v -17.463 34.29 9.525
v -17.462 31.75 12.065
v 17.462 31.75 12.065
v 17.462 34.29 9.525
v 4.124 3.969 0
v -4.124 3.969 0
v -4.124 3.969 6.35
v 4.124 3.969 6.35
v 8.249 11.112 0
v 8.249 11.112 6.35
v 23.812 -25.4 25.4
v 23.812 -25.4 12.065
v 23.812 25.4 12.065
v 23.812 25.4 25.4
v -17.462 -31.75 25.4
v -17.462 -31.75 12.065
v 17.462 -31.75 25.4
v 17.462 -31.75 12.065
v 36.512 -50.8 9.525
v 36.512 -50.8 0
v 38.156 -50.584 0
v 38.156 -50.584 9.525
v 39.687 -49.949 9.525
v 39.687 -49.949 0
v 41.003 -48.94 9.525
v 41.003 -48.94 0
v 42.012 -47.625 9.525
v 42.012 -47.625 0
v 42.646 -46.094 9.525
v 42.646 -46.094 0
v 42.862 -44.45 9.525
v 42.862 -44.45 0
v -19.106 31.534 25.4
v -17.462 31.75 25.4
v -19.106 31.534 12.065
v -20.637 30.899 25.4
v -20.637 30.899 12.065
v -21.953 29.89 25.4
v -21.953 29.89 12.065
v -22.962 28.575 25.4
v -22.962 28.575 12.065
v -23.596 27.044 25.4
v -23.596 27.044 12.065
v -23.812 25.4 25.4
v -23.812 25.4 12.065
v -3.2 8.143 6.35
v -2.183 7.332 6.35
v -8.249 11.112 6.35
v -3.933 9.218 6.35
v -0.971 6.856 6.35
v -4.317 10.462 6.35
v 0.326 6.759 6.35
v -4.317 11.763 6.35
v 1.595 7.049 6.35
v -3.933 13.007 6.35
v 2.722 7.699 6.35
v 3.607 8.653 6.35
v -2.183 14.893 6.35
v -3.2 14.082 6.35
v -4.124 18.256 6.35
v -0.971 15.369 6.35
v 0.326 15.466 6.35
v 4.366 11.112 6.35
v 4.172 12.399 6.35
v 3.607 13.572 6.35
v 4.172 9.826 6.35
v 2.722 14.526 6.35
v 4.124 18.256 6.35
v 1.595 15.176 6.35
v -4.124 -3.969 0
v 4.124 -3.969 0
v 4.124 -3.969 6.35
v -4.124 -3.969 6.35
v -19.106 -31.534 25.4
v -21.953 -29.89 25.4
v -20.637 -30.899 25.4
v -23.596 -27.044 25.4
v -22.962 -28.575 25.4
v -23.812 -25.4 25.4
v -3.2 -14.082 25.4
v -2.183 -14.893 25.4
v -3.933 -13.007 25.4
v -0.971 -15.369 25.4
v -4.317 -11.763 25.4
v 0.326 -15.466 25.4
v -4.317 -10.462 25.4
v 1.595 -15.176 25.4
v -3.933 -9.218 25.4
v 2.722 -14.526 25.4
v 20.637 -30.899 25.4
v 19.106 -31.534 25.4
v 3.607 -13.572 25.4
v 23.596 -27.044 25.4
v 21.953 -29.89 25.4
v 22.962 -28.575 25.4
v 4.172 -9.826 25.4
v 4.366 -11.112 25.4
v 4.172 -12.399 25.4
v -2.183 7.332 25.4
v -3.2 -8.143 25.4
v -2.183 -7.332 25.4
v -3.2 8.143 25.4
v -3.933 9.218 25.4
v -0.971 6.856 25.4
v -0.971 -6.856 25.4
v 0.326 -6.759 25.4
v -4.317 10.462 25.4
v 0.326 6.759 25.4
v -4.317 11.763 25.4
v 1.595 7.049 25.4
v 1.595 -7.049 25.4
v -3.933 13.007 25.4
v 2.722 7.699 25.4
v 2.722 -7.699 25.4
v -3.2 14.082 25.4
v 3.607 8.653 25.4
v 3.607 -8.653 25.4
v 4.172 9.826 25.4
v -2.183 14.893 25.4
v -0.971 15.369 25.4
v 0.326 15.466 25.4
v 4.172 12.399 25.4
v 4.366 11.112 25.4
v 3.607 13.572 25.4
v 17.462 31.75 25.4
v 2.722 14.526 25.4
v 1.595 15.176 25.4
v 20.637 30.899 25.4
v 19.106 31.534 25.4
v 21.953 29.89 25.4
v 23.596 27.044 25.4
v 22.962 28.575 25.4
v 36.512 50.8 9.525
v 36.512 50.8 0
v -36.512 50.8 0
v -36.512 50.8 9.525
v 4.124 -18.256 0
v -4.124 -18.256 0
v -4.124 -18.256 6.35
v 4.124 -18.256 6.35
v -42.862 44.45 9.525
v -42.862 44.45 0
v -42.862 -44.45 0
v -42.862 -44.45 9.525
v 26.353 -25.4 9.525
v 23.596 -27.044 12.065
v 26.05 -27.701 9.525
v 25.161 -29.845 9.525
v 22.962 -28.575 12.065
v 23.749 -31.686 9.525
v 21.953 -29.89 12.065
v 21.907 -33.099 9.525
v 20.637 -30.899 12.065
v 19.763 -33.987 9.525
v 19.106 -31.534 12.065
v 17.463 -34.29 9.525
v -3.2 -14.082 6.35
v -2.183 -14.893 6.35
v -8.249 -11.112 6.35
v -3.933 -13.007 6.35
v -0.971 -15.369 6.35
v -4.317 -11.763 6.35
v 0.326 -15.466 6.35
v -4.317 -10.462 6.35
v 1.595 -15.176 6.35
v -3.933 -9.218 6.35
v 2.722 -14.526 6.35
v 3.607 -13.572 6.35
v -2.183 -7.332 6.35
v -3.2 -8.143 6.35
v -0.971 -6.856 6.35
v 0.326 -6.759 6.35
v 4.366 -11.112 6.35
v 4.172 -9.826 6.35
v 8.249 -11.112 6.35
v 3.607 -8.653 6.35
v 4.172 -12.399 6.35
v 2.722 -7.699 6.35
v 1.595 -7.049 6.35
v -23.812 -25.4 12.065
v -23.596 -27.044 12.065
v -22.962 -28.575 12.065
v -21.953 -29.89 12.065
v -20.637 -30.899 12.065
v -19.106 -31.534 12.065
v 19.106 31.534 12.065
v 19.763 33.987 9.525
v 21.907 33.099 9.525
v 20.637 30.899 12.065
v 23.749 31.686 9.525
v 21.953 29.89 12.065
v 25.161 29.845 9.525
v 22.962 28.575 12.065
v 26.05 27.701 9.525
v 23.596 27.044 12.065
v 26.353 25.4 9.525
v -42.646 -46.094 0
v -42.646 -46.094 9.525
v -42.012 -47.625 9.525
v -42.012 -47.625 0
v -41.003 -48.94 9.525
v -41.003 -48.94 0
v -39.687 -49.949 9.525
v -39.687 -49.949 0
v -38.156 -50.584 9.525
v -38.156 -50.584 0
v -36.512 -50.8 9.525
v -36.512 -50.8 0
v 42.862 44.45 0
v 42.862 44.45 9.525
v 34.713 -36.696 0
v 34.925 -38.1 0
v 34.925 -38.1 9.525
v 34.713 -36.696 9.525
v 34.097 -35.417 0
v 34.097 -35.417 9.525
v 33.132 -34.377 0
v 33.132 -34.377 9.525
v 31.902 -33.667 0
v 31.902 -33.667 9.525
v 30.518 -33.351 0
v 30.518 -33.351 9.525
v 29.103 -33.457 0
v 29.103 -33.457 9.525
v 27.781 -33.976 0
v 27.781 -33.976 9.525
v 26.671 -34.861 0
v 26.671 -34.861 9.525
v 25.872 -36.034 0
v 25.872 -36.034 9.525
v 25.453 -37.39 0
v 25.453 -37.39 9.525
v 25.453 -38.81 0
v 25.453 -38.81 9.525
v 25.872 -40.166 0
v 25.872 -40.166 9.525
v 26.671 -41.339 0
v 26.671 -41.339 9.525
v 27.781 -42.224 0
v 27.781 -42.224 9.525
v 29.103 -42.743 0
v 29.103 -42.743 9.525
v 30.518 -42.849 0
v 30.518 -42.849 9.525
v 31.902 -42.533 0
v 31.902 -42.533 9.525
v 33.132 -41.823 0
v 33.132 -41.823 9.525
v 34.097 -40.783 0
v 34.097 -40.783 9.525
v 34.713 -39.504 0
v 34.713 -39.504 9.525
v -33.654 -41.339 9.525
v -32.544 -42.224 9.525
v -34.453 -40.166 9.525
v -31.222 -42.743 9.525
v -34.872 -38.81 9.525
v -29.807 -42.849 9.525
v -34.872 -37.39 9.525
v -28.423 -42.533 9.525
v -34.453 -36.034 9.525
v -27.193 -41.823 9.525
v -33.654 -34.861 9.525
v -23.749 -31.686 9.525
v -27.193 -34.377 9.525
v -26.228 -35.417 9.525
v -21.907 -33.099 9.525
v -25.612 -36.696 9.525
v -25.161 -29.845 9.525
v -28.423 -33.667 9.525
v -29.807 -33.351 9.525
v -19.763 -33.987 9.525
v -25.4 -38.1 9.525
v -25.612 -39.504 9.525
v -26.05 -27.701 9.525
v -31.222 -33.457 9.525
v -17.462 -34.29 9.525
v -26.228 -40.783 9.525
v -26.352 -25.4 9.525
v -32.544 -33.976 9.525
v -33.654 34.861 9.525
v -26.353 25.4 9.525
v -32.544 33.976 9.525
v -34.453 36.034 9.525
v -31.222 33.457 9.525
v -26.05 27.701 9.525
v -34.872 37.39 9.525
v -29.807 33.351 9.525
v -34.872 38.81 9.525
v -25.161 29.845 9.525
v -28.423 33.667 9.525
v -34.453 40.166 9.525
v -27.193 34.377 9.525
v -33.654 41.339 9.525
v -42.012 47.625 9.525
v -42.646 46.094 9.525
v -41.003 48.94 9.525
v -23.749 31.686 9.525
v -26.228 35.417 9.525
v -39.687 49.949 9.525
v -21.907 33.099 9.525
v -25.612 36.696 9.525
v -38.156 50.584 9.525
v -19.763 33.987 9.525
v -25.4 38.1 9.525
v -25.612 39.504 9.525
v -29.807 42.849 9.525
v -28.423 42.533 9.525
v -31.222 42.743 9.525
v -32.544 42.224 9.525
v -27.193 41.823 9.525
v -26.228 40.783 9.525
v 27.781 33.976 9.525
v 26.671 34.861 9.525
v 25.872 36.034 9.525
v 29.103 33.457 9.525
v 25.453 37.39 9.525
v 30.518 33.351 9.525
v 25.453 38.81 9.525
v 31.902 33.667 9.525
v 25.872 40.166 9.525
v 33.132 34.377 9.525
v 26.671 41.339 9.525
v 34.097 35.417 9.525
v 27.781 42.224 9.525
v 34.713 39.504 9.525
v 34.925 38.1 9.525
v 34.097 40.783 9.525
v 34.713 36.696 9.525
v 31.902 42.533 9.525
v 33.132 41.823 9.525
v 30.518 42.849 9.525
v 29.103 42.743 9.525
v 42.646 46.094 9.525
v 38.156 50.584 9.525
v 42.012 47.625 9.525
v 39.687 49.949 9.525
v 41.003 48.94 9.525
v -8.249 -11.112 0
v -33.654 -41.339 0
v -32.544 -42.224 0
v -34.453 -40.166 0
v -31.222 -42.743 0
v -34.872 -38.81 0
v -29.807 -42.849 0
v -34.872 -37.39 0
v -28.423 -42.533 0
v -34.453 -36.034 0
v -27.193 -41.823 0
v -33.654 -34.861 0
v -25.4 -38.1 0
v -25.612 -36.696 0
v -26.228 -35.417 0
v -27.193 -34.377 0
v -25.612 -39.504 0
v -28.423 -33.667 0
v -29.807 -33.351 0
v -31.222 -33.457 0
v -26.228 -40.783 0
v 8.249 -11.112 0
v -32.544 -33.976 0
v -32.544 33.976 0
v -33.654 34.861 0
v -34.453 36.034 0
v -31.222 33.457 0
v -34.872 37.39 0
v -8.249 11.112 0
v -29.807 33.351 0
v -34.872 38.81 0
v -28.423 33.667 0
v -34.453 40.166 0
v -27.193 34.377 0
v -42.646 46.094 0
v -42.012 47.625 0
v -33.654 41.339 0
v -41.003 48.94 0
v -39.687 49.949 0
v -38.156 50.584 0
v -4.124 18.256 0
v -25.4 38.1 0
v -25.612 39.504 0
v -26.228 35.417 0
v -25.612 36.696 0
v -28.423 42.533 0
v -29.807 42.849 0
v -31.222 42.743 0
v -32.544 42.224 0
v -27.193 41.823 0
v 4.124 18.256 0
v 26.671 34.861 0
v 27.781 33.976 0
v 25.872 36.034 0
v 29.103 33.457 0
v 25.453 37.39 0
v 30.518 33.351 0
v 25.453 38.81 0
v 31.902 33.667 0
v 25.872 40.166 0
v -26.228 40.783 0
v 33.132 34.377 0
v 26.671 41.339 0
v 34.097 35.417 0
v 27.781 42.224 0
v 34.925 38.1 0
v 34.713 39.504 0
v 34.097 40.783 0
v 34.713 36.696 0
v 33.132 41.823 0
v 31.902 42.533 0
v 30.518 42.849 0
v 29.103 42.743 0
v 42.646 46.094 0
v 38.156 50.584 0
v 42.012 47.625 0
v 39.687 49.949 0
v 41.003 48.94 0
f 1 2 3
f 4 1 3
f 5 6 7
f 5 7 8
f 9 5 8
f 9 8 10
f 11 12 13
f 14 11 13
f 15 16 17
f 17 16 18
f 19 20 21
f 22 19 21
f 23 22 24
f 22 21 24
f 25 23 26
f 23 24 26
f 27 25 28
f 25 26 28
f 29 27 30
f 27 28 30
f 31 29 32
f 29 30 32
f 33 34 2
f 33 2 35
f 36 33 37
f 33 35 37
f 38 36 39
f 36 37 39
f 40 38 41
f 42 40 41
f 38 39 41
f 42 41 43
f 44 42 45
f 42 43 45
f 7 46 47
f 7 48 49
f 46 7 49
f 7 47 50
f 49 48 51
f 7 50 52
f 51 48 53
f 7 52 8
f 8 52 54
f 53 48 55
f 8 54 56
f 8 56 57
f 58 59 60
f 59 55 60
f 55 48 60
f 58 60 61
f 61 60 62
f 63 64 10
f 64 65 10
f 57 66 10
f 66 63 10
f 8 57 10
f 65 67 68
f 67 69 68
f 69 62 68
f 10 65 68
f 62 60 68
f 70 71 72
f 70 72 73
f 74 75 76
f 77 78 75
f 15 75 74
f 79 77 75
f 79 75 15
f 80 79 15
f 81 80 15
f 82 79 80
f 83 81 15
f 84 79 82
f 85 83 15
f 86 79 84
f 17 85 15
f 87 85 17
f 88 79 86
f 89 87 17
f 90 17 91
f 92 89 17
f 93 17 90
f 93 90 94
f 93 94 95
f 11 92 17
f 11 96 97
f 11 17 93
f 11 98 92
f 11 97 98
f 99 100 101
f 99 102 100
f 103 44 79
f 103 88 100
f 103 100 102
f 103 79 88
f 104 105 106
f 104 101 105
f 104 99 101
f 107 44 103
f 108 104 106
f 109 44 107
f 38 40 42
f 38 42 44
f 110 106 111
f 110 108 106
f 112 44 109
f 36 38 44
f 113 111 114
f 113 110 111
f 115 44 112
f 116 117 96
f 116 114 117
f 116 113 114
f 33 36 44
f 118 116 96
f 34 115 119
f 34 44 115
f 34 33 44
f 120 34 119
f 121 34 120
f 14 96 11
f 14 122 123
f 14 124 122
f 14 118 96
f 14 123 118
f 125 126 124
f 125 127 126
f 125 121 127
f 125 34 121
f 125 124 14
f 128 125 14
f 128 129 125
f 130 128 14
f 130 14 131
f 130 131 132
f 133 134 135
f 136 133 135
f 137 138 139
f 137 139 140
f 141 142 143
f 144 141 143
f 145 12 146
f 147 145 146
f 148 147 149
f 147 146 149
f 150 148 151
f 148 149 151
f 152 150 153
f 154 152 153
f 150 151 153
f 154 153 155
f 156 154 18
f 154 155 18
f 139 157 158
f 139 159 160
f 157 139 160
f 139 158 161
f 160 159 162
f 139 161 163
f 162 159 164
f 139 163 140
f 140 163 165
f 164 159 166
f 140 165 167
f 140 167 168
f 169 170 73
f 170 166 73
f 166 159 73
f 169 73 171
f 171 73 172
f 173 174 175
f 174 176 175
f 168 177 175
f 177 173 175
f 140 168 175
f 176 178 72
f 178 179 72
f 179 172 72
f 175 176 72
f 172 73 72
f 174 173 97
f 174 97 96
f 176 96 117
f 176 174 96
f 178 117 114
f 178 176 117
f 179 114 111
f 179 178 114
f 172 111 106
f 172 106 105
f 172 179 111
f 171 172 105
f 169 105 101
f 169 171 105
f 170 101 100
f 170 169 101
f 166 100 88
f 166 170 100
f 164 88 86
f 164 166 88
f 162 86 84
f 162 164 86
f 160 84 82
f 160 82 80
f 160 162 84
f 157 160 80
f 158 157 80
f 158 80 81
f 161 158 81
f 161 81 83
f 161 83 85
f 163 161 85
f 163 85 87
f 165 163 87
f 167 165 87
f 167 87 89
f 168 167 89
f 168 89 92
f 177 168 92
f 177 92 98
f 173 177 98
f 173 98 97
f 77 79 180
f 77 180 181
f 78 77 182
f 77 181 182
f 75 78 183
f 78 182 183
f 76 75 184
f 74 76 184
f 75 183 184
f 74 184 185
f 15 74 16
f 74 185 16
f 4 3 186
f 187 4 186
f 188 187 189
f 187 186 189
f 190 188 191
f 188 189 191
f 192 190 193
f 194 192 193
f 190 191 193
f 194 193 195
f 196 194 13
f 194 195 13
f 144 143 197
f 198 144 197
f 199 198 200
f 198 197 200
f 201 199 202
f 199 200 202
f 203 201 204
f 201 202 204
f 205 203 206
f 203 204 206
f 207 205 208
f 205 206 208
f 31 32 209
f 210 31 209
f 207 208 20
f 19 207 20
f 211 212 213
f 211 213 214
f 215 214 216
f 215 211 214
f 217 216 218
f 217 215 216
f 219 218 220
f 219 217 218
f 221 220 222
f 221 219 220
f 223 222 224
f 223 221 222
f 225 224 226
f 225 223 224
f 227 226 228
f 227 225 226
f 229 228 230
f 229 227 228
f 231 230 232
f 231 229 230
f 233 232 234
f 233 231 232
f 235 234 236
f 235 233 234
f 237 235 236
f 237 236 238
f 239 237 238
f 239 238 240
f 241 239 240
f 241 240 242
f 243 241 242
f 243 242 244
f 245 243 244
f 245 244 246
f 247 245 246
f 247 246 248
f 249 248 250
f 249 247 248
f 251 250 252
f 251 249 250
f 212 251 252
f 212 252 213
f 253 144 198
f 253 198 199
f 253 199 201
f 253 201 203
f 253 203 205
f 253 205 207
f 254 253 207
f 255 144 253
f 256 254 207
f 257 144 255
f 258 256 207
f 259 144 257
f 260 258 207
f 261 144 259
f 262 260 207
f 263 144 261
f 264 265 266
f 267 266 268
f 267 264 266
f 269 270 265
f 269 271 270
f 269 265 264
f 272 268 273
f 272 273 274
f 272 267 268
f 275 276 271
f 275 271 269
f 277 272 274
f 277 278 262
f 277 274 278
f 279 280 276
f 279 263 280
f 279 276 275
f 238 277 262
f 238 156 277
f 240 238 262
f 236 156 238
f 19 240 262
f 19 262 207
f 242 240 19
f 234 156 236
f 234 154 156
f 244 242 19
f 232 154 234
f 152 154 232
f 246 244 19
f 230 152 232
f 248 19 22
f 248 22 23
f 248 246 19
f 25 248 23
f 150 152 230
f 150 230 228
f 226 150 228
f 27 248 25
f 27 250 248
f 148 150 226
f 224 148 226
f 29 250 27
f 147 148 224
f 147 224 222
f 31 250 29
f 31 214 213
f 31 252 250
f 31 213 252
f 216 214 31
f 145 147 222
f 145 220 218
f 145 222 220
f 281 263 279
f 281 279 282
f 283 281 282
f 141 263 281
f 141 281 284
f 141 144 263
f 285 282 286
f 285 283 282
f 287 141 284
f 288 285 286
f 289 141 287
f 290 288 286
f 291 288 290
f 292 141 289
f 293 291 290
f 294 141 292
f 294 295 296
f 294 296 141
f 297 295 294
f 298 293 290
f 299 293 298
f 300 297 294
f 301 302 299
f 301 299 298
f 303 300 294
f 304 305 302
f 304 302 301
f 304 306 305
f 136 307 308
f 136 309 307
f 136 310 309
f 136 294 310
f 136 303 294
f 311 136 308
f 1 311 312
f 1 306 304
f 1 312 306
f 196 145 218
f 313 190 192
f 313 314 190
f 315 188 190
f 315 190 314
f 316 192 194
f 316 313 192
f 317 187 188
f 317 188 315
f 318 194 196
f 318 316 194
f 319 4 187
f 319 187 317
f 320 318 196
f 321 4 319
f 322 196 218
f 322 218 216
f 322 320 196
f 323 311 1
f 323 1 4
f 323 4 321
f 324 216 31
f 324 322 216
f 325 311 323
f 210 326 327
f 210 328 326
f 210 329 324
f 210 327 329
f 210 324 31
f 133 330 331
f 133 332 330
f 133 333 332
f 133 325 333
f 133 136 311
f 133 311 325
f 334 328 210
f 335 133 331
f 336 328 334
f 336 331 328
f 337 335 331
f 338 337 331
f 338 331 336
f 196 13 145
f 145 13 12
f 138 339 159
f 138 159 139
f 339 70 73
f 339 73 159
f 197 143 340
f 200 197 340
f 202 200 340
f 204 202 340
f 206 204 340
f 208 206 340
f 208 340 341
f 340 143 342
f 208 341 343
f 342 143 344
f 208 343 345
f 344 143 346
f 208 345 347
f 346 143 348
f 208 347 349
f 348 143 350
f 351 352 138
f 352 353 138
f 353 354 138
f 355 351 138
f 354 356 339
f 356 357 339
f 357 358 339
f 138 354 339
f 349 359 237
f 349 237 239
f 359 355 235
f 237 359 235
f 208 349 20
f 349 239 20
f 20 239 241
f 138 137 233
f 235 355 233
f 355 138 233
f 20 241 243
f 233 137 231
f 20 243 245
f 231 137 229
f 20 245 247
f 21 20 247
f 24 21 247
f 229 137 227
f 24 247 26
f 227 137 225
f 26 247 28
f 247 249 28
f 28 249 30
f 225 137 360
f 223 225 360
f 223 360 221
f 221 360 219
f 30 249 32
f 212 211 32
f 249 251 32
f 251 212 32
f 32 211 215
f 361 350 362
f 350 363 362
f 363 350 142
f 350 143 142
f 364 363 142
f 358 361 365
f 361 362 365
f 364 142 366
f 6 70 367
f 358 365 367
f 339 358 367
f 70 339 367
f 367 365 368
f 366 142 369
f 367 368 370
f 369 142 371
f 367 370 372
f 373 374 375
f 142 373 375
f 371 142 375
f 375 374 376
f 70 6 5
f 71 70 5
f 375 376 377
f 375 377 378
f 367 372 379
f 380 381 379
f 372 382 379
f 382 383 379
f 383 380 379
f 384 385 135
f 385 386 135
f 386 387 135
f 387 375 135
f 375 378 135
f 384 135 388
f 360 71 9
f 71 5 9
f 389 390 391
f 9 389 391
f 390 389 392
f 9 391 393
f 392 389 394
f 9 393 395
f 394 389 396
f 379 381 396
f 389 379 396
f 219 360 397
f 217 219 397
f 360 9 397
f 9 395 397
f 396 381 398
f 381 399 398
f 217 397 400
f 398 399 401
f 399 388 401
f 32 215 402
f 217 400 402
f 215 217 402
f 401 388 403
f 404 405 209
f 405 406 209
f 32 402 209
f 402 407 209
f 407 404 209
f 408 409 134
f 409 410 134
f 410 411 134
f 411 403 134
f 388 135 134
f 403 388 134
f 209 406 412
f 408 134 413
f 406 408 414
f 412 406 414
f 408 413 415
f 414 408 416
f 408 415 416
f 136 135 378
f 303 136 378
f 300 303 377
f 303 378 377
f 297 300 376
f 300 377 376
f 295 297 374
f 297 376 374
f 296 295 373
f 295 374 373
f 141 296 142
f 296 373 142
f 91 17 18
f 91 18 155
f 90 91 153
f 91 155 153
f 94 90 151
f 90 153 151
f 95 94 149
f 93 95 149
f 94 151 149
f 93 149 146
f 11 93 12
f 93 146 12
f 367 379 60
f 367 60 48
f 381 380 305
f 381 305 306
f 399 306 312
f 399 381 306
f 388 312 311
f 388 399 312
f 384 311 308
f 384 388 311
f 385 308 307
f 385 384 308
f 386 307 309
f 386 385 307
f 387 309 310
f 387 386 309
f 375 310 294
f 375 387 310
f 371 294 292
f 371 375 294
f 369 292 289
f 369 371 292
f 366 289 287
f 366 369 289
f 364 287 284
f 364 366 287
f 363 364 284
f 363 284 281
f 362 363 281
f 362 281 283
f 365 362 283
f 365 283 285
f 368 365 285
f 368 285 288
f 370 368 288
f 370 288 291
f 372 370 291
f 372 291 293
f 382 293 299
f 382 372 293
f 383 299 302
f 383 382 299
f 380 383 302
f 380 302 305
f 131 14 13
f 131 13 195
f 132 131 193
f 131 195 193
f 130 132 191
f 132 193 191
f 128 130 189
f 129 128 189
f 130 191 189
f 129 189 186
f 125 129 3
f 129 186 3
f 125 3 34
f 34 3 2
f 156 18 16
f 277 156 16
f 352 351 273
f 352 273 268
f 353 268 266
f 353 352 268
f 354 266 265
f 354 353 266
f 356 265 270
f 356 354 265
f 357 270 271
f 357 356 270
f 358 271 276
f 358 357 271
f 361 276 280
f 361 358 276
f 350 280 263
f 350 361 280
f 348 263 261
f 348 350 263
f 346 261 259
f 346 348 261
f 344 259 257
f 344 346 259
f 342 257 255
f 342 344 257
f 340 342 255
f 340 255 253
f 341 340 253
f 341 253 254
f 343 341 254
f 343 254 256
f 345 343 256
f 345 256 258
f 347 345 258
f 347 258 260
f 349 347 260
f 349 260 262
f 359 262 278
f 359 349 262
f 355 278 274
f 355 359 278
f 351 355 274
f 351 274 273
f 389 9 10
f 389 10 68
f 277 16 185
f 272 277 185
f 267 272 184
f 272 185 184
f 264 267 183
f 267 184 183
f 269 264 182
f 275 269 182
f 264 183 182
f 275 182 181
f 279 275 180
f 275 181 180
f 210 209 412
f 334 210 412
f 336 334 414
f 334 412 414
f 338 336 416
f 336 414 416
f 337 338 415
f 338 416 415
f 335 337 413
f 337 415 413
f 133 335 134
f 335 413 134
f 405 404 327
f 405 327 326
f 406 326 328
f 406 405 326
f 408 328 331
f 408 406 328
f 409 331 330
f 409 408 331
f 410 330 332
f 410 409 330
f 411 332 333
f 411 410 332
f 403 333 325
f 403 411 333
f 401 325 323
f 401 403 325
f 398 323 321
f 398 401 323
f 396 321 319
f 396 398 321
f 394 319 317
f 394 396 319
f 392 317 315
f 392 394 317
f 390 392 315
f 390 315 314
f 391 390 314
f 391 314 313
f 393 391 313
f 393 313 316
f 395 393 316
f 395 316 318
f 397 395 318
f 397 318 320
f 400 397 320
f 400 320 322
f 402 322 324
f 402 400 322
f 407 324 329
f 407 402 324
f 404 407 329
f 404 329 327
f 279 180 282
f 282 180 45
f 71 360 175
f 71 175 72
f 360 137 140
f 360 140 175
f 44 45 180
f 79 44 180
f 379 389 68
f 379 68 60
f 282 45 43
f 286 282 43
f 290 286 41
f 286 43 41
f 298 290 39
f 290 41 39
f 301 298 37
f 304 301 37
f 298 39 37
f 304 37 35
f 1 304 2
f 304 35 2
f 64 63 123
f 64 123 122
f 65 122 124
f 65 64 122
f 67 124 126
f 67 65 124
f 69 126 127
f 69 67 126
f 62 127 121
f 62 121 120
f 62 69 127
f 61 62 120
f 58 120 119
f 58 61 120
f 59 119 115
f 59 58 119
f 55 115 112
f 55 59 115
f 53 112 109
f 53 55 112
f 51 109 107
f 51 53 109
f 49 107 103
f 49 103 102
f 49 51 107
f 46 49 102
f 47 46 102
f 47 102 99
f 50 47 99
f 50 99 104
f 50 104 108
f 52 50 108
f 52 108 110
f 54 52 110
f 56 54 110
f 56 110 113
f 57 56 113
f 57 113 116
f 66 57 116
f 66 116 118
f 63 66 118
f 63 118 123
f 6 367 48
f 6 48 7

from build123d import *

# Parameters (mm, degrees)
F0_R     = 4.365625
F0_R_2   = 4.7625
F1_DEPTH = 9.525
F2_DEPTH = 25.4
F3_SIZE  = 2.54
F4_DEPTH = 6.35


with BuildPart() as f1:
    # F0 (on Top) → F1 (new body)
    with BuildSketch(Plane.XY):
        Polygon((-4.124446, -18.25625), (4.124446, -18.25625), (8.248892, -11.1125), (4.124446, -3.96875), (-4.124446, -3.96875), (-8.248892, -11.1125), align=None)
        with Locations((0, -11.1125)):
            Circle(F0_R, mode=Mode.SUBTRACT)
        with BuildLine():
            Line((17.4625, 31.75), (-17.4625, 31.75))
            ThreePointArc((-17.4625, 31.75), (-21.952628, 29.890128), (-23.8125, 25.4))
            Line((-23.8125, 25.4), (-23.8125, -25.4))
            ThreePointArc((-23.8125, -25.4), (-21.952628, -29.890128), (-17.4625, -31.75))
            Line((-17.4625, -31.75), (17.4625, -31.75))
            ThreePointArc((17.4625, -31.75), (21.952628, -29.890128), (23.8125, -25.4))
            Line((23.8125, -25.4), (23.8125, 25.4))
            ThreePointArc((23.8125, 25.4), (21.952628, 29.890128), (17.4625, 31.75))
        make_face()
        Polygon((8.248892, -11.1125), (4.124446, -18.25625), (-4.124446, -18.25625), (-8.248892, -11.1125), (-4.124446, -3.96875), (4.124446, -3.96875), align=None, mode=Mode.SUBTRACT)
        Polygon((-8.248892, 11.1125), (-4.124446, 18.25625), (4.124446, 18.25625), (8.248892, 11.1125), (4.124446, 3.96875), (-4.124446, 3.96875), align=None, mode=Mode.SUBTRACT)
        with BuildLine():
            Line((36.5125, 50.8), (-36.5125, 50.8))
            ThreePointArc((-36.5125, 50.8), (-41.002628, 48.940128), (-42.8625, 44.45))
            Line((-42.8625, 44.45), (-42.8625, -44.45))
            ThreePointArc((-42.8625, -44.45), (-41.002628, -48.940128), (-36.5125, -50.8))
            Line((-36.5125, -50.8), (36.5125, -50.8))
            ThreePointArc((36.5125, -50.8), (41.002628, -48.940128), (42.8625, -44.45))
            Line((42.8625, -44.45), (42.8625, 44.45))
            ThreePointArc((42.8625, 44.45), (41.002628, 48.940128), (36.5125, 50.8))
        make_face()
        with Locations((-30.1625, -38.1)):
            Circle(F0_R_2, mode=Mode.SUBTRACT)
        with Locations((30.1625, -38.1)):
            Circle(F0_R_2, mode=Mode.SUBTRACT)
        with BuildLine():
            ThreePointArc((-23.8125, 25.4), (-21.952628, 29.890128), (-17.4625, 31.75))
            Line((-17.4625, 31.75), (17.4625, 31.75))
            ThreePointArc((17.4625, 31.75), (21.952628, 29.890128), (23.8125, 25.4))
            Line((23.8125, 25.4), (23.8125, -25.4))
            ThreePointArc((23.8125, -25.4), (21.952628, -29.890128), (17.4625, -31.75))
            Line((17.4625, -31.75), (-17.4625, -31.75))
            ThreePointArc((-17.4625, -31.75), (-21.952628, -29.890128), (-23.8125, -25.4))
            Line((-23.8125, -25.4), (-23.8125, 25.4))
        make_face(mode=Mode.SUBTRACT)
        with Locations((-30.1625, 38.1)):
            Circle(F0_R_2, mode=Mode.SUBTRACT)
        with Locations((30.1625, 38.1)):
            Circle(F0_R_2, mode=Mode.SUBTRACT)
        Polygon((4.124446, 18.25625), (-4.124446, 18.25625), (-8.248892, 11.1125), (-4.124446, 3.96875), (4.124446, 3.96875), (8.248892, 11.1125), align=None)
        with Locations((0, 11.1125)):
            Circle(F0_R, mode=Mode.SUBTRACT)
    extrude(amount=F1_DEPTH)

    # F0 (on Top) → F2 (join)
    with BuildSketch(Plane.XY):
        with BuildLine():
            Line((17.4625, 31.75), (-17.4625, 31.75))
            ThreePointArc((-17.4625, 31.75), (-21.952628, 29.890128), (-23.8125, 25.4))
            Line((-23.8125, 25.4), (-23.8125, -25.4))
            ThreePointArc((-23.8125, -25.4), (-21.952628, -29.890128), (-17.4625, -31.75))
            Line((-17.4625, -31.75), (17.4625, -31.75))
            ThreePointArc((17.4625, -31.75), (21.952628, -29.890128), (23.8125, -25.4))
            Line((23.8125, -25.4), (23.8125, 25.4))
            ThreePointArc((23.8125, 25.4), (21.952628, 29.890128), (17.4625, 31.75))
        make_face()
        Polygon((8.248892, -11.1125), (4.124446, -18.25625), (-4.124446, -18.25625), (-8.248892, -11.1125), (-4.124446, -3.96875), (4.124446, -3.96875), align=None, mode=Mode.SUBTRACT)
        Polygon((-8.248892, 11.1125), (-4.124446, 18.25625), (4.124446, 18.25625), (8.248892, 11.1125), (4.124446, 3.96875), (-4.124446, 3.96875), align=None, mode=Mode.SUBTRACT)
        Polygon((4.124446, 18.25625), (-4.124446, 18.25625), (-8.248892, 11.1125), (-4.124446, 3.96875), (4.124446, 3.96875), (8.248892, 11.1125), align=None)
        with Locations((0, 11.1125)):
            Circle(F0_R, mode=Mode.SUBTRACT)
        Polygon((-4.124446, -18.25625), (4.124446, -18.25625), (8.248892, -11.1125), (4.124446, -3.96875), (-4.124446, -3.96875), (-8.248892, -11.1125), align=None)
        with Locations((0, -11.1125)):
            Circle(F0_R, mode=Mode.SUBTRACT)
    extrude(amount=F2_DEPTH)

    # F3
    f3_edges = [f1.edges().sort_by_distance(p)[0] for p in [
        (23.8125, 0, 9.525),
    ]]
    chamfer(f3_edges, length=F3_SIZE)

    # F0 (on Top) → F4 (cut)
    with BuildSketch(Plane.XY):
        Polygon((4.124446, 18.25625), (-4.124446, 18.25625), (-8.248892, 11.1125), (-4.124446, 3.96875), (4.124446, 3.96875), (8.248892, 11.1125), align=None)
        with Locations((0, 11.1125)):
            Circle(F0_R, mode=Mode.SUBTRACT)
        Polygon((-4.124446, -18.25625), (4.124446, -18.25625), (8.248892, -11.1125), (4.124446, -3.96875), (-4.124446, -3.96875), (-8.248892, -11.1125), align=None)
        with Locations((0, -11.1125)):
            Circle(F0_R, mode=Mode.SUBTRACT)
    extrude(amount=F4_DEPTH, mode=Mode.SUBTRACT)


solid = f1.part
